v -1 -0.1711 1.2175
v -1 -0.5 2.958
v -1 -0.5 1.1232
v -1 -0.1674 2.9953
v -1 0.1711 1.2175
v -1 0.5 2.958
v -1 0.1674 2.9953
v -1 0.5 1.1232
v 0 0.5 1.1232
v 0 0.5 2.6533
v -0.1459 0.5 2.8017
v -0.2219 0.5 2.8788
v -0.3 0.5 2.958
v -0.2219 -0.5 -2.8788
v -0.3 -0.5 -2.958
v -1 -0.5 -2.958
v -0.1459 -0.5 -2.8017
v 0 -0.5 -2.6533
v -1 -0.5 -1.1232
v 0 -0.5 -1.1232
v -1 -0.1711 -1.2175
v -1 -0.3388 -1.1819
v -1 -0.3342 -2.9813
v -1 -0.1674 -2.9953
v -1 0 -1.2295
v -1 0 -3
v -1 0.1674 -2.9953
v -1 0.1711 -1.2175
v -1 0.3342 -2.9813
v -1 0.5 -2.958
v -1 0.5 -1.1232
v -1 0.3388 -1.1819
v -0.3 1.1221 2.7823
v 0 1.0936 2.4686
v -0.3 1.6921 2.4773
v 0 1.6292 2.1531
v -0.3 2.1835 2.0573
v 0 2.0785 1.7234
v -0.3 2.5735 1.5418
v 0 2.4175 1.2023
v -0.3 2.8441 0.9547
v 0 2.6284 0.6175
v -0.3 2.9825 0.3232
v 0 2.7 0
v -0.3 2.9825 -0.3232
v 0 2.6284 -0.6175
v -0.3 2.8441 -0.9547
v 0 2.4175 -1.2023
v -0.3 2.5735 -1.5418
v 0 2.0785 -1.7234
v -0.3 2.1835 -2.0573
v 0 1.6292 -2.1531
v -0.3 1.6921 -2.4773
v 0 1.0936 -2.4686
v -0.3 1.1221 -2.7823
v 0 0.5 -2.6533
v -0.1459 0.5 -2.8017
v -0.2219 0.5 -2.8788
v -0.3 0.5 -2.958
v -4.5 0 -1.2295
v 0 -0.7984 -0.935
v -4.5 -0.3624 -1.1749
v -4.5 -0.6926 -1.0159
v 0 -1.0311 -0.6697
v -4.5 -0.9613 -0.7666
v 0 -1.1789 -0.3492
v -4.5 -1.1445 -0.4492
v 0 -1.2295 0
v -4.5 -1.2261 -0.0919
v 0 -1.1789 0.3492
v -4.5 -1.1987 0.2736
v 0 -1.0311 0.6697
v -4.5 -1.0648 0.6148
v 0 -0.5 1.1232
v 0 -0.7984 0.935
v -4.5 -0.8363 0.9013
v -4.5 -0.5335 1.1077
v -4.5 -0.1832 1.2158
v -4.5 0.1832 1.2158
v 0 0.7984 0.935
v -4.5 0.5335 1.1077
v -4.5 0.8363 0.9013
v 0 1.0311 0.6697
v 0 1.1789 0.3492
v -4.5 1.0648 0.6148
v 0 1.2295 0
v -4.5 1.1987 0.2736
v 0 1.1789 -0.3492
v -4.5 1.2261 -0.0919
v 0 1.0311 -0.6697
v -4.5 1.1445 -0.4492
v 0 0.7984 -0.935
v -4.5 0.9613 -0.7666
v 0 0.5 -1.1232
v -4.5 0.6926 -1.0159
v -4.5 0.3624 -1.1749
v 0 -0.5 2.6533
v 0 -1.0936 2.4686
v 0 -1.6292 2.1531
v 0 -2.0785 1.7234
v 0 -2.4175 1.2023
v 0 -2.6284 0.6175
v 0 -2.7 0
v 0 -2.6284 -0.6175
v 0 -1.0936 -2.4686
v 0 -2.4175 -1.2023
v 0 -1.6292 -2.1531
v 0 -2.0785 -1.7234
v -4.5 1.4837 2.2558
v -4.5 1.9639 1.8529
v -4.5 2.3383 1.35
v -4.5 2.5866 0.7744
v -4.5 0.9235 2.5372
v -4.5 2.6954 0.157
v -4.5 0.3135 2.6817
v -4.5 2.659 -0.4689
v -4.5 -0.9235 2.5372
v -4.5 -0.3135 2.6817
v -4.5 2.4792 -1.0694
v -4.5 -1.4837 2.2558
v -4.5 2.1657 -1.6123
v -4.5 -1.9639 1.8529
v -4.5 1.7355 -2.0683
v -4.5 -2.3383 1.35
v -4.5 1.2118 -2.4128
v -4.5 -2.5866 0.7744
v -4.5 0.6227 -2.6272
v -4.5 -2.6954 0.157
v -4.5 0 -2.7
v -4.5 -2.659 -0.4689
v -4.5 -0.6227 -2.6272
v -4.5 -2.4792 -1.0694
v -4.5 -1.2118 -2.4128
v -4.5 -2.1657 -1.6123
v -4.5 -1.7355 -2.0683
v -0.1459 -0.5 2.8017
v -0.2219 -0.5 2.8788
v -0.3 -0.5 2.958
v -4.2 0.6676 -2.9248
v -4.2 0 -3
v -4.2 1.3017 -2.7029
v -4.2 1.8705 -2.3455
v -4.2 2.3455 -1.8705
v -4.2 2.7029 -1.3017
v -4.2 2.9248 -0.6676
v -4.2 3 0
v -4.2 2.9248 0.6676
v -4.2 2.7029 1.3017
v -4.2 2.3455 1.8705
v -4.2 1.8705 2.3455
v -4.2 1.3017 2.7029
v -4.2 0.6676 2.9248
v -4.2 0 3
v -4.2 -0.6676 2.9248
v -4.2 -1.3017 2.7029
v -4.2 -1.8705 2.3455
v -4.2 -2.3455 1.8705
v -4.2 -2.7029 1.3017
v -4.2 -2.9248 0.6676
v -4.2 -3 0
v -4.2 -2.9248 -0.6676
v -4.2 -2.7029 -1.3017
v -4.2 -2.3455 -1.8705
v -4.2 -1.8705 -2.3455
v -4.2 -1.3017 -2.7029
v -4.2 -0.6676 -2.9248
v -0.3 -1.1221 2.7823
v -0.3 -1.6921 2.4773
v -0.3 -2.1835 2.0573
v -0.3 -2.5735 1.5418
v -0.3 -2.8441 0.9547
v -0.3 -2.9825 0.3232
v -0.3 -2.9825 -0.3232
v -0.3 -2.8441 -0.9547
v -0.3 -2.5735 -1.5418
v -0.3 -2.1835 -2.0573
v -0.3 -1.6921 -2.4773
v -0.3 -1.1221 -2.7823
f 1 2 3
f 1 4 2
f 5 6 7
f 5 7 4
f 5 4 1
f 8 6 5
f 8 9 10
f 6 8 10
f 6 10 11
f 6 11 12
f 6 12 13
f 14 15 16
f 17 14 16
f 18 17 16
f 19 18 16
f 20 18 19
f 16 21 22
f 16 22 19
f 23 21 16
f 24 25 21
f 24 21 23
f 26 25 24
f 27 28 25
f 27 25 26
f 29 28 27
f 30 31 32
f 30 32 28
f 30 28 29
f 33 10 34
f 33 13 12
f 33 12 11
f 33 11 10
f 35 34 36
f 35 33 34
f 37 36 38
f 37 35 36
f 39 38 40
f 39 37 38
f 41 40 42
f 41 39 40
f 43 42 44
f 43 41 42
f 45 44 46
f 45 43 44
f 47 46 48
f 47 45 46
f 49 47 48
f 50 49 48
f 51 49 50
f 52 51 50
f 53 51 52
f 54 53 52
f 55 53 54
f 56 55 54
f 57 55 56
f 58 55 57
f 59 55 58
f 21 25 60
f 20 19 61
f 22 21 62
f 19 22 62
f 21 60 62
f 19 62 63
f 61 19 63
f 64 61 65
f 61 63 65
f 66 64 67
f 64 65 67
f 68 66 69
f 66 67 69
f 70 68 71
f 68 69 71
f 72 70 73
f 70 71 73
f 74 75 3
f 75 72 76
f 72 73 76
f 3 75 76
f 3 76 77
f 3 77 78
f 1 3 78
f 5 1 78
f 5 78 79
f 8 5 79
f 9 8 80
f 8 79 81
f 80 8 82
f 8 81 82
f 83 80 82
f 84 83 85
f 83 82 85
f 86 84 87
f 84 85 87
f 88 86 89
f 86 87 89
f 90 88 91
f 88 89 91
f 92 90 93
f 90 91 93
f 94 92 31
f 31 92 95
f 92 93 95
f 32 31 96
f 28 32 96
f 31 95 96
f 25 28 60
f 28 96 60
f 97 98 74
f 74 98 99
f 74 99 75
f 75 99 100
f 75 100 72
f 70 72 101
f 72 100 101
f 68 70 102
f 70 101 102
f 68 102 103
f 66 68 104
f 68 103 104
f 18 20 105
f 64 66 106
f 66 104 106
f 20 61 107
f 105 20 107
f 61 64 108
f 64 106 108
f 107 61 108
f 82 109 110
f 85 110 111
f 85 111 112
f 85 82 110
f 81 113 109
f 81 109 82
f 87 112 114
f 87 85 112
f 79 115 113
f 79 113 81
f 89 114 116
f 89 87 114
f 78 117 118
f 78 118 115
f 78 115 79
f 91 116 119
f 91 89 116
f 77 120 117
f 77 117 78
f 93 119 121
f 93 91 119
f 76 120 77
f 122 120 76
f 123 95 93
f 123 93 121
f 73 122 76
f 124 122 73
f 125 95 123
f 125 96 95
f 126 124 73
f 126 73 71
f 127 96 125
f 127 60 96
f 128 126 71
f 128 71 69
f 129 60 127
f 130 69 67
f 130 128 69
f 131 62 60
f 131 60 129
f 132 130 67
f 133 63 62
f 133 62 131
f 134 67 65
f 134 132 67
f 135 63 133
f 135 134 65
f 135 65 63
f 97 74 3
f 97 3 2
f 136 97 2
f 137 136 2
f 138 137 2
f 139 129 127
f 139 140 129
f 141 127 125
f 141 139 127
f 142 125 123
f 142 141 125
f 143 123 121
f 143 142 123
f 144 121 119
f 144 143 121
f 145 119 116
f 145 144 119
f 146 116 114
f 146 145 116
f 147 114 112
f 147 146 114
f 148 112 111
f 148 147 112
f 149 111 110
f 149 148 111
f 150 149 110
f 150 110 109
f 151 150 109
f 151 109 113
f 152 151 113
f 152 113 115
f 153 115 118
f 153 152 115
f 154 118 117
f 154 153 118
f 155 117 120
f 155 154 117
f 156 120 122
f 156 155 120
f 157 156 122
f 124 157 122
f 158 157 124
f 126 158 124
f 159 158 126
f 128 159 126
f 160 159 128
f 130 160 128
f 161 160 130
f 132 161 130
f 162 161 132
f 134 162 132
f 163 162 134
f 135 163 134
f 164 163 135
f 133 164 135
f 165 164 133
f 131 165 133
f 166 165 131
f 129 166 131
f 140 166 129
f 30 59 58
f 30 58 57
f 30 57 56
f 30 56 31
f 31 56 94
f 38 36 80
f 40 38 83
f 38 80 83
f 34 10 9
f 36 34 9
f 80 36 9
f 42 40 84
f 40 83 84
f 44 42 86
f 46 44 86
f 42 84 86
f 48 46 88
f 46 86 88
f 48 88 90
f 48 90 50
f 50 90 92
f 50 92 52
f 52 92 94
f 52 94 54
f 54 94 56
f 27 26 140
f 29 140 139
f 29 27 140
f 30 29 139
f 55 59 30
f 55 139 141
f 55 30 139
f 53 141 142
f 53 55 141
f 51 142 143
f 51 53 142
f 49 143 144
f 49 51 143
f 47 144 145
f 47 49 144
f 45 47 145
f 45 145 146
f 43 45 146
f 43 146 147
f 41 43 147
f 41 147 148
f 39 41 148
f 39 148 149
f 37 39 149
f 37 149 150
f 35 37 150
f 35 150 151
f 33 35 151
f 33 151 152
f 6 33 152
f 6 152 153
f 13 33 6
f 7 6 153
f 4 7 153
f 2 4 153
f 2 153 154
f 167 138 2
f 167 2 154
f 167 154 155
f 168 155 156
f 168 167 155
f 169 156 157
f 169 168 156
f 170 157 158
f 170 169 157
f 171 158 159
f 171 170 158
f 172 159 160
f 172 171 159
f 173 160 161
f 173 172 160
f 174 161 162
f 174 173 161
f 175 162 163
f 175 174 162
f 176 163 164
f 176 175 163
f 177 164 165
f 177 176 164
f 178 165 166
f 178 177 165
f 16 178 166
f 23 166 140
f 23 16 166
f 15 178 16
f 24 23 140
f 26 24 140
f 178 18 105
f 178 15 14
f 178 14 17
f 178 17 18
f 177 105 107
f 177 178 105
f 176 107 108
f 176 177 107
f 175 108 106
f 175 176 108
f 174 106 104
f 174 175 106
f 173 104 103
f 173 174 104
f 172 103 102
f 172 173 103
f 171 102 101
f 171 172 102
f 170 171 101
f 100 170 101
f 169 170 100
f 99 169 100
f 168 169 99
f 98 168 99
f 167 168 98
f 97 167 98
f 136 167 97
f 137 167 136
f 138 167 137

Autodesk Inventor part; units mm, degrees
ref_plane "YZ Plane" through (0, 0, 0) normal (1, 0, 0) x (0, 1, 0)
ref_plane "XZ Plane" through (0, 0, 0) normal (0, 1, 0) x (-1, 0, 0)
ref_plane "XY Plane" through (0, 0, 0) normal (0, 0, 1) x (1, 0, 0)
sketch "スケッチ1" plane through (0, 0, 0) normal (0, 1, 0) x (-1, 0, 0)
  line L0 (0, 0) -> (4.5, 0)
  line L1 (4.5, 0) -> (4.5, -3)
  line L2 (4.5, -3) -> (0, -3)
  line L3 (0, -3) -> (0, 0)
  dimension "d0" = 4.5
  dimension "d1" = 3
revolve "回転1" add sketch "スケッチ1" angle 360 about axis through (0, 0, 0) along (-1, 0, 0)
sketch "スケッチ2" plane through (0, 0, 0) normal (1, 0, 0) x (0, 0, -1)
  point P0 (0, 0)
  point P1 (0, 0)
hole "穴1" at (0, 0, 0) direction (-1, 0, 0) diameter 2.459 end through all thread size "M3x0.5" class "6H" standard "ANSI Metric M Profile"
sketch "スケッチ3" plane through (0, 0, 0) normal (1, 0, 0) x (0, 0, -1)
  circle A0 centre (0, 0) radius 3 projected
  line L0 (3, 0) -> (-3, 0)
  line L1 (3, -0.5) -> (-3, -0.5)
  line L2 (3, 0.5) -> (-3, 0.5)
  line L3 (3, 0.5) -> (3, -0.5)
  line L4 (-3, 0.5) -> (-3, -0.5)
  point P0 (-2.958, -0.5)
  point P1 (2.958, -0.5)
  point P2 (2.958, 0.5)
  point P3 (-2.958, 0.5)
  dimension "d10" = 0.5
extrude "押し出し1" cut sketch "スケッチ3" against normal blind 1 contours L0 A0 L2 | A0 L1 L0
chamfer "面取り1" distance 0.3 angle 45 3 edges at (-4.5, 0, 3) (0, 3, 0) (0, -3, 0)
properties part number "ARU-304_5S" material "ステンレス鋼 AISI 304"
